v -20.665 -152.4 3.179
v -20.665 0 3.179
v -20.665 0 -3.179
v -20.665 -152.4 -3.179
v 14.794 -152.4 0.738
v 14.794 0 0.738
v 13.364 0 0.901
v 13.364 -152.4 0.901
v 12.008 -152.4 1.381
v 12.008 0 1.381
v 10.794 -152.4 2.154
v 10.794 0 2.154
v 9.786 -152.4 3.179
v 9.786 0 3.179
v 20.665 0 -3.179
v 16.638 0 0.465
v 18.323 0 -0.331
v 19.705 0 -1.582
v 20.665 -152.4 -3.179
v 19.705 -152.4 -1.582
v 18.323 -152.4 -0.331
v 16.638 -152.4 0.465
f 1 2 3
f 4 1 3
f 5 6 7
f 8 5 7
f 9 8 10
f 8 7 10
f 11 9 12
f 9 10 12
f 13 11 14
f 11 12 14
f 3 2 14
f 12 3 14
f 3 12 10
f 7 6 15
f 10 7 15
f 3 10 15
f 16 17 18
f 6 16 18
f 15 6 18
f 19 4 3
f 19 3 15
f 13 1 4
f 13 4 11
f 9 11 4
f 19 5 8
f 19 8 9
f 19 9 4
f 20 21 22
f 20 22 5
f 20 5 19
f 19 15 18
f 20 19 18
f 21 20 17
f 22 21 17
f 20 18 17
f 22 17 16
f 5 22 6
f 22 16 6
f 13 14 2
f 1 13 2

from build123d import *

# Parameters (mm, degrees)
F1_DEPTH = 152.4


# Not quite as in the source:
# - ends of sketch curves that miss each other by under 0.0002 mm in the source are joined


with BuildPart() as f1:
    # F0 (on Front) → F1 (new body)
    with BuildSketch(Plane.XZ):
        with BuildLine():
            ThreePointArc((14.7938744, 0.7382764), (12.0081110559, 1.3810143829), (9.7855278, 3.1792672))
            Line((9.7855278, 3.1792672), (-20.665186, 3.1792672))
            Line((-20.665186, 3.1792672), (-20.665186, -3.1792672))
            Line((-20.665186, -3.1792672), (20.6652114, -3.1792672))
            ThreePointArc((20.6652114, -3.1792672), (18.3230324667, -0.331016316), (14.7938744, 0.7382764))
        make_face()
    extrude(amount=F1_DEPTH)


solid = f1.part
